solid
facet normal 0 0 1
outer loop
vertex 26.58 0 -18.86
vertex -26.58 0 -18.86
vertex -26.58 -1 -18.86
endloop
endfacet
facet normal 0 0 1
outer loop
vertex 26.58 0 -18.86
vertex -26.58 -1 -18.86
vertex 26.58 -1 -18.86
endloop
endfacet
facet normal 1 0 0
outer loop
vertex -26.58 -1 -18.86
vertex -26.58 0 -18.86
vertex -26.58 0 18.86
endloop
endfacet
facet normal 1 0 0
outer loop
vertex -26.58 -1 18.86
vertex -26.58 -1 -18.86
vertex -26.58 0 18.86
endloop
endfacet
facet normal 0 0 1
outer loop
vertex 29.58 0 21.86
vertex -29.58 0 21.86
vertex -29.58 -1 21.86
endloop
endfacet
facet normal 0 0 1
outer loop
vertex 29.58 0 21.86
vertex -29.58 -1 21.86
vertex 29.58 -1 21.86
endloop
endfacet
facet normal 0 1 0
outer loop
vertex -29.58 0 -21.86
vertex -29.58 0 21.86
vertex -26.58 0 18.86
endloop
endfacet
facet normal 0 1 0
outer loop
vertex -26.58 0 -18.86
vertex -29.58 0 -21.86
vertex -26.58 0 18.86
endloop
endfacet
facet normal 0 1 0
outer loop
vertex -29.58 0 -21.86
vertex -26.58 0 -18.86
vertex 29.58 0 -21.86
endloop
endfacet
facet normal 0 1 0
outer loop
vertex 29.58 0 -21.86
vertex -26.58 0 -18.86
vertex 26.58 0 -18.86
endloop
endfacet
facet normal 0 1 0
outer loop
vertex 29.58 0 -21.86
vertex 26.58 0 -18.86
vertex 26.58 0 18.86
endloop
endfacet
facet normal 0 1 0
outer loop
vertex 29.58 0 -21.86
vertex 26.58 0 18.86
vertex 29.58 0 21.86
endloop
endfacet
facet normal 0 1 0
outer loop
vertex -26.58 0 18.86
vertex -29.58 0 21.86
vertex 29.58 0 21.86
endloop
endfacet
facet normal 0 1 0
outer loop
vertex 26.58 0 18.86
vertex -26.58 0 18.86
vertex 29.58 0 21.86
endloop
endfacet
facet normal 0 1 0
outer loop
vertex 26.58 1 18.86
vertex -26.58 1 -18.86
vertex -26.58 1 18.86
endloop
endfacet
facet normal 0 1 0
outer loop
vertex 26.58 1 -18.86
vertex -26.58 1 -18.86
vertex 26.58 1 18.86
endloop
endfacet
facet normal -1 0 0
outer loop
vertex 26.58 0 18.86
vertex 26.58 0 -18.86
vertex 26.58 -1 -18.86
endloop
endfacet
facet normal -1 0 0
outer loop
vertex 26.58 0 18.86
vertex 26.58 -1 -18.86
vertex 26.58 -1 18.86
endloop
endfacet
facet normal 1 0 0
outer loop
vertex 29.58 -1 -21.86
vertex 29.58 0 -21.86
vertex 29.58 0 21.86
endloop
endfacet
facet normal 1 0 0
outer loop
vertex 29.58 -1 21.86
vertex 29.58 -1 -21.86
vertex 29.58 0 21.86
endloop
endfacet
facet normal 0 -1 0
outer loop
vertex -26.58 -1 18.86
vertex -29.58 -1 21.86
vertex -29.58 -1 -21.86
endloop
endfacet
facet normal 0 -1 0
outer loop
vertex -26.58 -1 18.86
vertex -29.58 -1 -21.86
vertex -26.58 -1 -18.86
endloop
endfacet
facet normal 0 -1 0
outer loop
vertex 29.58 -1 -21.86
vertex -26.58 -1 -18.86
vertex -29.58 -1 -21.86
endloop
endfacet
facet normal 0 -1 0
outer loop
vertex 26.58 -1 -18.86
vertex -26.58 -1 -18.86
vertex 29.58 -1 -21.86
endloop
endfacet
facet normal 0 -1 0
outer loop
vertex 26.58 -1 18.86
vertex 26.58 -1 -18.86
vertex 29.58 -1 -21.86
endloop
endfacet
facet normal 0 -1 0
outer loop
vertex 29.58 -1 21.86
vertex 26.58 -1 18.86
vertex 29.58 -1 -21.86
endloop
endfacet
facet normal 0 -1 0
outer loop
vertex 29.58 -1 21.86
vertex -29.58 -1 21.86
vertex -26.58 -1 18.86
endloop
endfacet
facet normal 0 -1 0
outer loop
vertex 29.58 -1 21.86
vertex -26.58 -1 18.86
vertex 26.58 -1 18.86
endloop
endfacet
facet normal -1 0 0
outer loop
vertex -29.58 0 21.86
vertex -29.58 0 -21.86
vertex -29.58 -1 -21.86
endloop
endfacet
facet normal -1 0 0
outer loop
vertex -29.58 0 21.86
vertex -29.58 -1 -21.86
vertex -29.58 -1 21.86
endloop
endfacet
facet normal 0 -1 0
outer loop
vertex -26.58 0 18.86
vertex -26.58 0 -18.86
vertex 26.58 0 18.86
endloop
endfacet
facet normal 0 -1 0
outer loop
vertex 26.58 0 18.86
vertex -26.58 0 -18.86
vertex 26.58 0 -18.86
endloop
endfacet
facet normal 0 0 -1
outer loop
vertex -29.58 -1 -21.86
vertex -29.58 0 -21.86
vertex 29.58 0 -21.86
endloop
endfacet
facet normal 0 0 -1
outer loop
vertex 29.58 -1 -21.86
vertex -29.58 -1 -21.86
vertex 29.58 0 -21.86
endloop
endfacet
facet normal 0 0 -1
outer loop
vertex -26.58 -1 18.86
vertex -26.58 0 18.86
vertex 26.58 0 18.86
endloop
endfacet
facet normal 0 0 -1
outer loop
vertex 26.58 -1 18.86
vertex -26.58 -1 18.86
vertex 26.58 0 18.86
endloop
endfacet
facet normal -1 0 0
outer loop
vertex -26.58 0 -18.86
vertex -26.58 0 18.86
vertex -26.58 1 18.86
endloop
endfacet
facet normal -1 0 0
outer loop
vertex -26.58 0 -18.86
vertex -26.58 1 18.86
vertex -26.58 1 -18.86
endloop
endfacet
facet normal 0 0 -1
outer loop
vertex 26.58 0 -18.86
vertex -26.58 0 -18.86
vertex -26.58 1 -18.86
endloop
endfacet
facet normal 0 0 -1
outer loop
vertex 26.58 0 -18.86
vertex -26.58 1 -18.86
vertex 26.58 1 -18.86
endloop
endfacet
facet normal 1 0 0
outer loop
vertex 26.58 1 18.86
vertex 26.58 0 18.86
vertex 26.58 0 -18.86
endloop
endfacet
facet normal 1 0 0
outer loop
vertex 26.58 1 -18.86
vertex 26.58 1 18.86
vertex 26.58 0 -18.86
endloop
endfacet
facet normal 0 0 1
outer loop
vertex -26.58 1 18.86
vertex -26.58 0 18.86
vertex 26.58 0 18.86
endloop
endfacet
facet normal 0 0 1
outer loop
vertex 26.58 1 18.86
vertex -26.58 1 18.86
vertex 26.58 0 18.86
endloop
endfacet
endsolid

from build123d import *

# Parameters (mm, degrees)
SKETCH1_W           = 53.16
SKETCH1_H           = 37.72
BOSS_EXTRUDE1_DEPTH = 1
SKETCH2_W           = 59.16
SKETCH2_H           = 43.72
SKETCH2_W_2         = 53.16
SKETCH2_H_2         = 37.72
BOSS_EXTRUDE2_DEPTH = 1


with BuildPart() as part:
    # Sketch1 → Boss-Extrude1 (new body)
    with BuildSketch(Plane(origin=(0, 0, 0), x_dir=(1, 0, 0), z_dir=(0, 1, 0))):
        Rectangle(SKETCH1_W, SKETCH1_H)
    extrude(amount=BOSS_EXTRUDE1_DEPTH)


with BuildPart() as body_2:
    # Sketch2 → Boss-Extrude2 (new body)
    with BuildSketch(Plane.XZ):
        Rectangle(SKETCH2_W, SKETCH2_H)
        Rectangle(SKETCH2_W_2, SKETCH2_H_2, mode=Mode.SUBTRACT)
    extrude(amount=BOSS_EXTRUDE2_DEPTH)


solid = Compound([part.part, body_2.part])
